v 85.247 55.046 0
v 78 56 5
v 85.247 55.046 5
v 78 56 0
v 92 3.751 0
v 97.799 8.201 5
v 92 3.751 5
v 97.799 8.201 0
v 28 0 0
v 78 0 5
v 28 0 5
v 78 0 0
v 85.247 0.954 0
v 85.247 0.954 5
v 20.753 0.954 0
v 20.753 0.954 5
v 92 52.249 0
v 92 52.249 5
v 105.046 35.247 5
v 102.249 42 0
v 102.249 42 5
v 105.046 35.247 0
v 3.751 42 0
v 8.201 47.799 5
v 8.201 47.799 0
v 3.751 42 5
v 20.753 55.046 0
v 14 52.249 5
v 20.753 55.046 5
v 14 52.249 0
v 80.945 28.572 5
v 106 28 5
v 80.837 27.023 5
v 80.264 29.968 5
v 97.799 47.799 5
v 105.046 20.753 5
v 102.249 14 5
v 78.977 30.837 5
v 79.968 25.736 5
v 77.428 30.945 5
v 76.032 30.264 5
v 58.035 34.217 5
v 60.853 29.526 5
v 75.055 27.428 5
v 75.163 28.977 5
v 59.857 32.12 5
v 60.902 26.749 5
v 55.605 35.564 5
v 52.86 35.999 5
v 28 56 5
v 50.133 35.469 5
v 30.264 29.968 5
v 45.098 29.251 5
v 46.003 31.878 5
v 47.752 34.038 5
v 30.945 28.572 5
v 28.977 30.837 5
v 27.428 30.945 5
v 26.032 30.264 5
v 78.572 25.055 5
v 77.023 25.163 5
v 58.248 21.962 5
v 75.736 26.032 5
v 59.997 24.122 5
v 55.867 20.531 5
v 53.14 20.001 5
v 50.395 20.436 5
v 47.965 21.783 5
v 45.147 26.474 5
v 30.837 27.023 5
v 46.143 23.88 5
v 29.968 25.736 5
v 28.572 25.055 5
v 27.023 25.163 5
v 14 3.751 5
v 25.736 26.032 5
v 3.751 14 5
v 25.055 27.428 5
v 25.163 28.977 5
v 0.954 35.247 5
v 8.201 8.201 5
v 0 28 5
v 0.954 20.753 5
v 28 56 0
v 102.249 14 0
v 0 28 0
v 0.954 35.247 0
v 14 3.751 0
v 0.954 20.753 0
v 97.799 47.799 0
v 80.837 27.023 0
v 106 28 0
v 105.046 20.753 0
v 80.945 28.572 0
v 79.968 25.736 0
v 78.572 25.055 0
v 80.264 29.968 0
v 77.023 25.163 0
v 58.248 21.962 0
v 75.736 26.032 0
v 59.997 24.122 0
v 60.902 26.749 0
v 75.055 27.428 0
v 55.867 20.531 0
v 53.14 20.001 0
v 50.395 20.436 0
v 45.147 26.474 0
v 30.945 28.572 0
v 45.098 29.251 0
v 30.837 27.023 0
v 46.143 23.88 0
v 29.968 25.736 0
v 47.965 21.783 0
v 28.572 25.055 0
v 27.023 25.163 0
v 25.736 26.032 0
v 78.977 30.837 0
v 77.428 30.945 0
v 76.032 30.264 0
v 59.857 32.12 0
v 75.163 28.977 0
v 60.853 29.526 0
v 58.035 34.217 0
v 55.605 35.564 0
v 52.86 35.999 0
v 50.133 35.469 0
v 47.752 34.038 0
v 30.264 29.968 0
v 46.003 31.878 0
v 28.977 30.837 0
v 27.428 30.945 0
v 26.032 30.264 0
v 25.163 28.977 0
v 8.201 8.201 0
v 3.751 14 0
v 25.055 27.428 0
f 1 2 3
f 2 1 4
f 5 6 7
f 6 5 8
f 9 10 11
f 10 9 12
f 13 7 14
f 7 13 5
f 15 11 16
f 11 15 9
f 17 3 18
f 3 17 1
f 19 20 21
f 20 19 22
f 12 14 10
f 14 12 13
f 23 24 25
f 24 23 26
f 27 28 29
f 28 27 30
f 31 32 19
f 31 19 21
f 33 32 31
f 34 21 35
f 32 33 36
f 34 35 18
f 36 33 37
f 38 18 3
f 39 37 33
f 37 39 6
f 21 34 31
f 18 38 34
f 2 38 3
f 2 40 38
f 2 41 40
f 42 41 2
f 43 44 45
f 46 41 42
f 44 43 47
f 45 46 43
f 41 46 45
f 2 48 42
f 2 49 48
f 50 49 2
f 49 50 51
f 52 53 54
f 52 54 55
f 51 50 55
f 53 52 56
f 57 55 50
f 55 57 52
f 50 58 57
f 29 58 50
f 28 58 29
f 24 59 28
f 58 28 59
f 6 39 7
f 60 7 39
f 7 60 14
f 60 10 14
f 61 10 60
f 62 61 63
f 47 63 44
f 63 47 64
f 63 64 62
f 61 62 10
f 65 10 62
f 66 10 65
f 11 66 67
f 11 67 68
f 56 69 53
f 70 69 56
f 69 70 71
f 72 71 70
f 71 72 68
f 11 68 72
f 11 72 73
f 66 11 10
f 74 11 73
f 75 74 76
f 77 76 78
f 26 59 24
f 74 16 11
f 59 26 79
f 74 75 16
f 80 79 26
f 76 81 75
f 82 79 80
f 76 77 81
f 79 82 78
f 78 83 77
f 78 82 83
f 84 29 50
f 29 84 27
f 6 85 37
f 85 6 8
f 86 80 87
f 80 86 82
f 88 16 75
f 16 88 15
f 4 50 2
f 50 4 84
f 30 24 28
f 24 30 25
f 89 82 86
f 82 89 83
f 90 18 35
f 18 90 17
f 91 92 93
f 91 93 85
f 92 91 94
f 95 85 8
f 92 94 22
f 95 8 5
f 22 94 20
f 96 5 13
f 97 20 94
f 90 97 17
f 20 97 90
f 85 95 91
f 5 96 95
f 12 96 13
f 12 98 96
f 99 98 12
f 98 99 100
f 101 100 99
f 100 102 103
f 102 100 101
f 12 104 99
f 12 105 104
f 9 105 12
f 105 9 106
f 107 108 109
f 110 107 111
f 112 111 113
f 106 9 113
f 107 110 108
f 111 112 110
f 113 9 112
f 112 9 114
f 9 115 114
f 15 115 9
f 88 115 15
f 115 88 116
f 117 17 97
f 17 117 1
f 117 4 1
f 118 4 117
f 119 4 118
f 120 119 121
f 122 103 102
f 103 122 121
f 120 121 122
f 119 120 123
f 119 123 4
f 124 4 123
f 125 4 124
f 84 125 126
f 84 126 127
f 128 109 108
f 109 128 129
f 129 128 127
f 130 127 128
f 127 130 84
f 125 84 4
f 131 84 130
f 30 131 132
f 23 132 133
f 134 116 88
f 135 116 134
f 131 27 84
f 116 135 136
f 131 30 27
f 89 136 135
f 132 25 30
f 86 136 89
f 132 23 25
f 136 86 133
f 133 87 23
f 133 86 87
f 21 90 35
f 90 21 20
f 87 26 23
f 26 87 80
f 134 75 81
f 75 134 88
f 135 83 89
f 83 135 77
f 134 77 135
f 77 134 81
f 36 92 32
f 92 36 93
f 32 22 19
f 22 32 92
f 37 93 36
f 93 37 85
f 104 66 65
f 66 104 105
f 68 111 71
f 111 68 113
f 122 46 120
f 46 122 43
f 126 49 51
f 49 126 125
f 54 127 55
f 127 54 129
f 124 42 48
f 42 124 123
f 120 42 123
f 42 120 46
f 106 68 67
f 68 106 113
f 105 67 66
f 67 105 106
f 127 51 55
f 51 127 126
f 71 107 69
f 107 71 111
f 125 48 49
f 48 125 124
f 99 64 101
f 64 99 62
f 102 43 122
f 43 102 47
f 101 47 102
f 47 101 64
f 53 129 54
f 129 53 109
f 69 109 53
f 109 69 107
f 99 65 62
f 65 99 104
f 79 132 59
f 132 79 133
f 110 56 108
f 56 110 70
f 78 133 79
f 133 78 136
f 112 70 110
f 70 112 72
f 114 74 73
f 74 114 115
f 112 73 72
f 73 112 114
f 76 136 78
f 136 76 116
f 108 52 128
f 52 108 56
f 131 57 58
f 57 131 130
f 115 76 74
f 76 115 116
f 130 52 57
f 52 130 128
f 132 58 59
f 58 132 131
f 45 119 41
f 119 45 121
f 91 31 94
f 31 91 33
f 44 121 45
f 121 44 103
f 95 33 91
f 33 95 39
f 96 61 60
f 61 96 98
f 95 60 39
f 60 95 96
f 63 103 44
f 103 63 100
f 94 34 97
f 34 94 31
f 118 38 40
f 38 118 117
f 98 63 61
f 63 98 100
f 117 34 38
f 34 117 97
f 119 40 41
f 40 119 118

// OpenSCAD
$fn = 32;

// ----------------------------------------------------------------------
// Spacer plate: obround span 50, caps R28
// ----------------------------------------------------------------------

// --- parameters (mm) ---
bore_r = 8;               // centre bore radius
bolt_r = 3;               // bolt hole radius
plate_t = 5;              // plate thickness, Z (extrusion height)
span = 50;                // obround span
cap_r = 28;               // cap radius

profile = [[28, 56], [20.753, 55.046], [14, 52.249], [8.201, 47.799], [3.751, 42], [0.954, 35.247], [0, 28], [0.954, 20.753], [3.751, 14], [8.201, 8.201], [14, 3.751], [20.753, 0.954], [28, 0], [78, 0], [85.247, 0.954], [92, 3.751], [97.799, 8.201], [102.249, 14], [105.046, 20.753], [106, 28], [105.046, 35.247], [102.249, 42], [97.799, 47.799], [92, 52.249], [85.247, 55.046], [78, 56]];  // primary outline, 26 points, counter clockwise
void_1 = [[60.853, 29.526], [59.857, 32.12], [58.035, 34.217], [55.605, 35.564], [52.86, 35.999], [50.133, 35.469], [47.752, 34.038], [46.003, 31.878], [45.098, 29.251], [45.147, 26.474], [46.143, 23.88], [47.965, 21.783], [50.395, 20.436], [53.14, 20.001], [55.867, 20.531], [58.248, 21.962], [59.997, 24.122], [60.902, 26.749]];  // centre bore, 18 points
void_2 = [[30.945, 28.572], [30.264, 29.968], [28.977, 30.837], [27.428, 30.945], [26.032, 30.264], [25.163, 28.977], [25.055, 27.428], [25.736, 26.032], [27.023, 25.163], [28.572, 25.055], [29.968, 25.736], [30.837, 27.023]];  // end hole, 12 points
void_3 = [[80.945, 28.572], [80.264, 29.968], [78.977, 30.837], [77.428, 30.945], [76.032, 30.264], [75.163, 28.977], [75.055, 27.428], [75.736, 26.032], [77.023, 25.163], [78.572, 25.055], [79.968, 25.736], [80.837, 27.023]];  // end hole, 12 points

// --- the one profile operation ---
difference() {
  linear_extrude(height = plate_t) polygon(points = profile);
  translate([0, 0, -1])
    linear_extrude(height = plate_t + 2) polygon(points = void_1);
  translate([0, 0, -1])
    linear_extrude(height = plate_t + 2) polygon(points = void_2);
  translate([0, 0, -1])
    linear_extrude(height = plate_t + 2) polygon(points = void_3);
}
